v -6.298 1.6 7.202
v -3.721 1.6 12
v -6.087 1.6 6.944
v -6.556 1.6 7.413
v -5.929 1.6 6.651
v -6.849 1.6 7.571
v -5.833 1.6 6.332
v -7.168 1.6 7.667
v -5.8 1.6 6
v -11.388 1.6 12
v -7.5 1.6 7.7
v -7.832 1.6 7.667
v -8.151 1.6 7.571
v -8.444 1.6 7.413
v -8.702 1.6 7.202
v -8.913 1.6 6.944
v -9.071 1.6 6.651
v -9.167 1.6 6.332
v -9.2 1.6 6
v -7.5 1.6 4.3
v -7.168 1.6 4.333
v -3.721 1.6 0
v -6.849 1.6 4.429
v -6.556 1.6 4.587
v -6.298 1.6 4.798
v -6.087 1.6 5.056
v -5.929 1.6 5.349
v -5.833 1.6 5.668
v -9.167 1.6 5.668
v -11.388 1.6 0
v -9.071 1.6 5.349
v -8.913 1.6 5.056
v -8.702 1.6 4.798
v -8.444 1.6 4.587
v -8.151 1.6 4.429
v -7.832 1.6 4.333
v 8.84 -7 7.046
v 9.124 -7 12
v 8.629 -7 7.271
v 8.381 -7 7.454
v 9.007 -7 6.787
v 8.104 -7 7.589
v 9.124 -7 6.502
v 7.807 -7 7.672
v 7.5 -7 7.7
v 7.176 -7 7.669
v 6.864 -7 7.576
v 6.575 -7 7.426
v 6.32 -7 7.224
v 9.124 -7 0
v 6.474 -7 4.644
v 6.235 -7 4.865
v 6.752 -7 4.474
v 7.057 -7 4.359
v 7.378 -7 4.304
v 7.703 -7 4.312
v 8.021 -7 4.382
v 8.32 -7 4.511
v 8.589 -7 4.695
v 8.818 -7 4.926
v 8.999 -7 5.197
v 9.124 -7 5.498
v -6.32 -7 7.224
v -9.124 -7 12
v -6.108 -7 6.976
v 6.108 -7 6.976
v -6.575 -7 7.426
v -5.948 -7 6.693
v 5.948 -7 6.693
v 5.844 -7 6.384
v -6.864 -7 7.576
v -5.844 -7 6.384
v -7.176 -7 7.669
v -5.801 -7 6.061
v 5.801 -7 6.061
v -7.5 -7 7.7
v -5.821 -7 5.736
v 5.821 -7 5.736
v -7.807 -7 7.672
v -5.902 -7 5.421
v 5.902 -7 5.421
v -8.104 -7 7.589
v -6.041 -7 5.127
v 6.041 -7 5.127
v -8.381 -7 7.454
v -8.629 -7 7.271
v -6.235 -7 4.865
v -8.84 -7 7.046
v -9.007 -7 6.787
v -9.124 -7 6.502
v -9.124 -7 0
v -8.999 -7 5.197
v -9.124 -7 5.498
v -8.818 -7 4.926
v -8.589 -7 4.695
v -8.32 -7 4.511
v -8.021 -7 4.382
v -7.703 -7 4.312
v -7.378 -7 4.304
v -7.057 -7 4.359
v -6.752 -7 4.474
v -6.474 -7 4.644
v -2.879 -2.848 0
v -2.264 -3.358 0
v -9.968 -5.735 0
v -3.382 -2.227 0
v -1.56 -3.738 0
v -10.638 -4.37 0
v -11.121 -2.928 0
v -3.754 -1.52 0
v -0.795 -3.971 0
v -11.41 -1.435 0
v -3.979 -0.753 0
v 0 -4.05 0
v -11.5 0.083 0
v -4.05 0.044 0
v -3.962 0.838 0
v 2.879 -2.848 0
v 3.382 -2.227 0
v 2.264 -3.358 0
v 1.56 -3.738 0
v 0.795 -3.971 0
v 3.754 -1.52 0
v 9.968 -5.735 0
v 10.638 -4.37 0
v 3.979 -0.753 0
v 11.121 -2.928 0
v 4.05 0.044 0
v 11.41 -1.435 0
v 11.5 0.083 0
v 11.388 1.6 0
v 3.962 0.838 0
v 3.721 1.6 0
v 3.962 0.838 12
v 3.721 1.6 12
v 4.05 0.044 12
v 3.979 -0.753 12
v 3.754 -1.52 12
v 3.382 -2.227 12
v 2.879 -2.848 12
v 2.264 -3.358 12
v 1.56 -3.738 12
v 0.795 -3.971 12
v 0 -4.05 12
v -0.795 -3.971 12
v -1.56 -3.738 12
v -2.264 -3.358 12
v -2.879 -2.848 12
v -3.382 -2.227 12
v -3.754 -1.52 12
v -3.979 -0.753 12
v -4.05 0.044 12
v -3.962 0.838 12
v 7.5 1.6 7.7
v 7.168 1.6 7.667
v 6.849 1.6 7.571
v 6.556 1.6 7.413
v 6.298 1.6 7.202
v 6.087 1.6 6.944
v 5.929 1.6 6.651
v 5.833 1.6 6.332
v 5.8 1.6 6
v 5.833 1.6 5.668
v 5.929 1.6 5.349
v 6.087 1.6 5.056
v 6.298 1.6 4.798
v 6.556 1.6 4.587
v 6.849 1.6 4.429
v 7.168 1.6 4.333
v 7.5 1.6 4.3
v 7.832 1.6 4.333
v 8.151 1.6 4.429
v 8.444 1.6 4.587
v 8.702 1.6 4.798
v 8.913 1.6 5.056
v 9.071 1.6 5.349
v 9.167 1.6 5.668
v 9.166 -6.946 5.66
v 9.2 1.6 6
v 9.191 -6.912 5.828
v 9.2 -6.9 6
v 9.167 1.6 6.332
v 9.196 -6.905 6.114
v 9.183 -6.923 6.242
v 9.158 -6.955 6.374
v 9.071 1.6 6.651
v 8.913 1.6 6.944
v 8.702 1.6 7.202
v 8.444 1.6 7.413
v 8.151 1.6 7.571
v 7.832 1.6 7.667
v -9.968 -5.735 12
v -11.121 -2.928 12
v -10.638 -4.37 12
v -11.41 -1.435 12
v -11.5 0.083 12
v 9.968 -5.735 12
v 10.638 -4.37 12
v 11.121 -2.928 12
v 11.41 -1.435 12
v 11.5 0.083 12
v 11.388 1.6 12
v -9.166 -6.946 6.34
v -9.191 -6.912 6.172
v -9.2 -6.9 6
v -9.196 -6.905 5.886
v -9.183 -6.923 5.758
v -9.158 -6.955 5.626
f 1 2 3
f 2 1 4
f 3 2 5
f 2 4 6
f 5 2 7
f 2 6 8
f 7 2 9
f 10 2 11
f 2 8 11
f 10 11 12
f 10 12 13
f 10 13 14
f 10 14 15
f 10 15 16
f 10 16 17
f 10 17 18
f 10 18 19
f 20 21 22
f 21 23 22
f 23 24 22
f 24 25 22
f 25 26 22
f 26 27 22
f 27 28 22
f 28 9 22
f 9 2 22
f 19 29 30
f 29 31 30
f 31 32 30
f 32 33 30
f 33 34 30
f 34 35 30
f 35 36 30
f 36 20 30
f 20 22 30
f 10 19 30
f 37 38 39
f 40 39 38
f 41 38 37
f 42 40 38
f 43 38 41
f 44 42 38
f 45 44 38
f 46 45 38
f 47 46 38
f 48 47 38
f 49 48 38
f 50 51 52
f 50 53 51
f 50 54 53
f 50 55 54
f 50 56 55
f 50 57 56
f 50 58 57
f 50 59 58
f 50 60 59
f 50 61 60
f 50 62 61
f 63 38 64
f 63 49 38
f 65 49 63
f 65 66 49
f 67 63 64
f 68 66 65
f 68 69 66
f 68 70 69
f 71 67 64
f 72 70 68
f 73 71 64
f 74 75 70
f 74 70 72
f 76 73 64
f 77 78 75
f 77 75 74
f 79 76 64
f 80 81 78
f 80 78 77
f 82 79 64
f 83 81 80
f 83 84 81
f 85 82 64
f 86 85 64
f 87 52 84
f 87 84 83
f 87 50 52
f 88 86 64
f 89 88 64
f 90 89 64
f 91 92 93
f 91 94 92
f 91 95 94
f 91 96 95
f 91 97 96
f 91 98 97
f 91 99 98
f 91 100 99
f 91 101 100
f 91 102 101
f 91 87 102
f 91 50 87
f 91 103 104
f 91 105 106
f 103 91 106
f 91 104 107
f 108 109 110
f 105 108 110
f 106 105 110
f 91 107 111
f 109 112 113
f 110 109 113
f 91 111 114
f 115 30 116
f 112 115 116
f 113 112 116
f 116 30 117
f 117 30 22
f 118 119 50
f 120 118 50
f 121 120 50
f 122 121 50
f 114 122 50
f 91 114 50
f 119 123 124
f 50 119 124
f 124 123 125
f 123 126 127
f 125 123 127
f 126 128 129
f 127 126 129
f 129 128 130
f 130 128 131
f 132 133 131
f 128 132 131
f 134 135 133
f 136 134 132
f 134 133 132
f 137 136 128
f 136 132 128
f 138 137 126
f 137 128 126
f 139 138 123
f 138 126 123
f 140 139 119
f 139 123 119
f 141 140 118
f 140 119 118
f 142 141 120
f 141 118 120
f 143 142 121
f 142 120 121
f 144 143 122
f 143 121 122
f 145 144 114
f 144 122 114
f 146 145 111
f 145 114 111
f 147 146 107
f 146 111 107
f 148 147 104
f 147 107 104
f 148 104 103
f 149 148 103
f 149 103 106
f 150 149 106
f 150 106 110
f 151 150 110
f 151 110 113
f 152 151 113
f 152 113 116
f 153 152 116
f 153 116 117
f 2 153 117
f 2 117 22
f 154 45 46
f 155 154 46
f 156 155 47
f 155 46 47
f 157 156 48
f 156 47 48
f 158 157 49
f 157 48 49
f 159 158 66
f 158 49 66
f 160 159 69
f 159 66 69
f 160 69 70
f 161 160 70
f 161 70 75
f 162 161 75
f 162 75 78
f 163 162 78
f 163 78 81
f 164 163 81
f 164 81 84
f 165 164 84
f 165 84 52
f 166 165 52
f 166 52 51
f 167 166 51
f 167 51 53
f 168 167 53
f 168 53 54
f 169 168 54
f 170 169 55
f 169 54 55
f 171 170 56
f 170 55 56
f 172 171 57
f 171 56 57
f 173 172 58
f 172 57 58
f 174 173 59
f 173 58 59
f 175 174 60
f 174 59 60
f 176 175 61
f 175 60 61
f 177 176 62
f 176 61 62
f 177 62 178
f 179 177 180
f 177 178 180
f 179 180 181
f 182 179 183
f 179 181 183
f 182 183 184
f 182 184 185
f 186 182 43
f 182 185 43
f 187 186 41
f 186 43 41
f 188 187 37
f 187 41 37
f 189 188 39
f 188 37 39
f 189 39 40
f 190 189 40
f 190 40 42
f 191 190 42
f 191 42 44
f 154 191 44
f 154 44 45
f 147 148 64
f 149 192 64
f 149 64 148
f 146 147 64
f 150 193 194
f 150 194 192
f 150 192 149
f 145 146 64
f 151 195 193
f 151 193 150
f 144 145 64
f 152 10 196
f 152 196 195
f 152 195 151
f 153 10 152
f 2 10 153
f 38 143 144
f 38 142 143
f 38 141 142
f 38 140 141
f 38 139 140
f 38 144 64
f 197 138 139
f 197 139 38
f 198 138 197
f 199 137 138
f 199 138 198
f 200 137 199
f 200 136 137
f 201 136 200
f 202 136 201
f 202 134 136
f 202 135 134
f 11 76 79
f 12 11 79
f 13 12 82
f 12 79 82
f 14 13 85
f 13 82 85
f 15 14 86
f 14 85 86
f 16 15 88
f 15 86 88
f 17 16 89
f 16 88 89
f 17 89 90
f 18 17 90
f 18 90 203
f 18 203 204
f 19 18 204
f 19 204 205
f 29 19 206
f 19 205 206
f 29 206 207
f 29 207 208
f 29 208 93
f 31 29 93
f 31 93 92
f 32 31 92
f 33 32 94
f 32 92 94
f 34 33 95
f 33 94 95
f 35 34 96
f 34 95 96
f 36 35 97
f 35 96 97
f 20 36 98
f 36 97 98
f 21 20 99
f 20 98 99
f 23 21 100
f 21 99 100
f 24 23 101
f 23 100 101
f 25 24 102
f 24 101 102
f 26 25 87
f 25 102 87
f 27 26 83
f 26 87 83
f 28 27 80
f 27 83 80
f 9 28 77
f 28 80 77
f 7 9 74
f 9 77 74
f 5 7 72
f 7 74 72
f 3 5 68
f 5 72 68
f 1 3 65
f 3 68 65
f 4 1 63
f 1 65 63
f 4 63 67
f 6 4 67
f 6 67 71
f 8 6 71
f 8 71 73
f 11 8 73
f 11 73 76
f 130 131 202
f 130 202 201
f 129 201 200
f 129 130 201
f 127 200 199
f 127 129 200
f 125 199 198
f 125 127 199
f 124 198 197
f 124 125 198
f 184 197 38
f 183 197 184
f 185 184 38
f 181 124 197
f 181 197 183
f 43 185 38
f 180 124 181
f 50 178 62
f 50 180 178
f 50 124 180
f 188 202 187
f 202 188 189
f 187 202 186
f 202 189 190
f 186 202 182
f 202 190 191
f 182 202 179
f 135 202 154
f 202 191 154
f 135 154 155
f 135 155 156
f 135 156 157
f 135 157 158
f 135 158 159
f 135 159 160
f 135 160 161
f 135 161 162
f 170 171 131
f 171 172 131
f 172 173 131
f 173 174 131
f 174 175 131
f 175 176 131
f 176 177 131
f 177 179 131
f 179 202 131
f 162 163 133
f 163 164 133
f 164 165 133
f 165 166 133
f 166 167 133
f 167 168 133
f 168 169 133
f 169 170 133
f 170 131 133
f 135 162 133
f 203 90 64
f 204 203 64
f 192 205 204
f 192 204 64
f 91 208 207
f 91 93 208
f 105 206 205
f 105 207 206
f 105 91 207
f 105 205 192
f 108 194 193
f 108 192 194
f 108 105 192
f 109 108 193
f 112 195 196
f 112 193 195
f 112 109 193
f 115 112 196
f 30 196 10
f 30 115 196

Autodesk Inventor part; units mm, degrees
ref_plane "YZ Plane" through (0, 0, 0) normal (1, 0, 0) x (0, 1, 0)
ref_plane "XZ Plane" through (0, 0, 0) normal (0, 1, 0) x (-1, 0, 0)
ref_plane "XY Plane" through (0, 0, 0) normal (0, 0, 1) x (1, 0, 0)
sketch "スケッチ1" plane through (0, 0, 0) normal (0, 0, 1) x (1, 0, 0)
  circle A0 centre (0, 0) radius 4.05
  circle A1 centre (0, 0) radius 11.5
  line L0 (-1.2, 1.6) -> (1.2, 1.6)
  line L1 (11.3882, 1.6) -> (1.2, 1.6)
  line L2 (-1.2, 1.6) -> (-11.3882, 1.6)
  circle A2 centre (0, 0) radius 2
  line L3 (9.1241, -7) -> (-9.1241, -7)
  point P0 (3.7206, 1.6)
  point P1 (-3.7206, 1.6)
  dimension "d0" = 8.1
  dimension "d1" = 23
  dimension "d3" = 4
  dimension "d4" = 2.4
  dimension "d5" = 7
extrude "押し出し1" add sketch "スケッチ1" along normal blind 12 contours A0 L1 A1 L3 L2
sketch "スケッチ3" plane through (-11.3882, 1.6, 0) normal (0, 1, 0) x (1, 0, 0)
  line L0 (22.7763, 0) -> (15.1087, 0) projected
  line L1 (7.6676, 0) -> (0, 0) projected
  point P0 (11.3882, 0)
  point P1 (3.8882, -6)
  point P2 (18.8882, -6)
  dimension "d8" = 6
  dimension "d9" = 7.5
  dimension "d10" = 7.5
  dimension "d11" = 6
hole "穴1" at (-7.5, 1.6, 6) at (7.5, 1.6, 6) direction (0, -1, 0) diameter 3.4 end through all
equation "\"d10\" = d9"
equation "\"d11\" = d8"
properties part number "SU22_3DP_EU_Sub_sn" material "ABS プラスチック"
